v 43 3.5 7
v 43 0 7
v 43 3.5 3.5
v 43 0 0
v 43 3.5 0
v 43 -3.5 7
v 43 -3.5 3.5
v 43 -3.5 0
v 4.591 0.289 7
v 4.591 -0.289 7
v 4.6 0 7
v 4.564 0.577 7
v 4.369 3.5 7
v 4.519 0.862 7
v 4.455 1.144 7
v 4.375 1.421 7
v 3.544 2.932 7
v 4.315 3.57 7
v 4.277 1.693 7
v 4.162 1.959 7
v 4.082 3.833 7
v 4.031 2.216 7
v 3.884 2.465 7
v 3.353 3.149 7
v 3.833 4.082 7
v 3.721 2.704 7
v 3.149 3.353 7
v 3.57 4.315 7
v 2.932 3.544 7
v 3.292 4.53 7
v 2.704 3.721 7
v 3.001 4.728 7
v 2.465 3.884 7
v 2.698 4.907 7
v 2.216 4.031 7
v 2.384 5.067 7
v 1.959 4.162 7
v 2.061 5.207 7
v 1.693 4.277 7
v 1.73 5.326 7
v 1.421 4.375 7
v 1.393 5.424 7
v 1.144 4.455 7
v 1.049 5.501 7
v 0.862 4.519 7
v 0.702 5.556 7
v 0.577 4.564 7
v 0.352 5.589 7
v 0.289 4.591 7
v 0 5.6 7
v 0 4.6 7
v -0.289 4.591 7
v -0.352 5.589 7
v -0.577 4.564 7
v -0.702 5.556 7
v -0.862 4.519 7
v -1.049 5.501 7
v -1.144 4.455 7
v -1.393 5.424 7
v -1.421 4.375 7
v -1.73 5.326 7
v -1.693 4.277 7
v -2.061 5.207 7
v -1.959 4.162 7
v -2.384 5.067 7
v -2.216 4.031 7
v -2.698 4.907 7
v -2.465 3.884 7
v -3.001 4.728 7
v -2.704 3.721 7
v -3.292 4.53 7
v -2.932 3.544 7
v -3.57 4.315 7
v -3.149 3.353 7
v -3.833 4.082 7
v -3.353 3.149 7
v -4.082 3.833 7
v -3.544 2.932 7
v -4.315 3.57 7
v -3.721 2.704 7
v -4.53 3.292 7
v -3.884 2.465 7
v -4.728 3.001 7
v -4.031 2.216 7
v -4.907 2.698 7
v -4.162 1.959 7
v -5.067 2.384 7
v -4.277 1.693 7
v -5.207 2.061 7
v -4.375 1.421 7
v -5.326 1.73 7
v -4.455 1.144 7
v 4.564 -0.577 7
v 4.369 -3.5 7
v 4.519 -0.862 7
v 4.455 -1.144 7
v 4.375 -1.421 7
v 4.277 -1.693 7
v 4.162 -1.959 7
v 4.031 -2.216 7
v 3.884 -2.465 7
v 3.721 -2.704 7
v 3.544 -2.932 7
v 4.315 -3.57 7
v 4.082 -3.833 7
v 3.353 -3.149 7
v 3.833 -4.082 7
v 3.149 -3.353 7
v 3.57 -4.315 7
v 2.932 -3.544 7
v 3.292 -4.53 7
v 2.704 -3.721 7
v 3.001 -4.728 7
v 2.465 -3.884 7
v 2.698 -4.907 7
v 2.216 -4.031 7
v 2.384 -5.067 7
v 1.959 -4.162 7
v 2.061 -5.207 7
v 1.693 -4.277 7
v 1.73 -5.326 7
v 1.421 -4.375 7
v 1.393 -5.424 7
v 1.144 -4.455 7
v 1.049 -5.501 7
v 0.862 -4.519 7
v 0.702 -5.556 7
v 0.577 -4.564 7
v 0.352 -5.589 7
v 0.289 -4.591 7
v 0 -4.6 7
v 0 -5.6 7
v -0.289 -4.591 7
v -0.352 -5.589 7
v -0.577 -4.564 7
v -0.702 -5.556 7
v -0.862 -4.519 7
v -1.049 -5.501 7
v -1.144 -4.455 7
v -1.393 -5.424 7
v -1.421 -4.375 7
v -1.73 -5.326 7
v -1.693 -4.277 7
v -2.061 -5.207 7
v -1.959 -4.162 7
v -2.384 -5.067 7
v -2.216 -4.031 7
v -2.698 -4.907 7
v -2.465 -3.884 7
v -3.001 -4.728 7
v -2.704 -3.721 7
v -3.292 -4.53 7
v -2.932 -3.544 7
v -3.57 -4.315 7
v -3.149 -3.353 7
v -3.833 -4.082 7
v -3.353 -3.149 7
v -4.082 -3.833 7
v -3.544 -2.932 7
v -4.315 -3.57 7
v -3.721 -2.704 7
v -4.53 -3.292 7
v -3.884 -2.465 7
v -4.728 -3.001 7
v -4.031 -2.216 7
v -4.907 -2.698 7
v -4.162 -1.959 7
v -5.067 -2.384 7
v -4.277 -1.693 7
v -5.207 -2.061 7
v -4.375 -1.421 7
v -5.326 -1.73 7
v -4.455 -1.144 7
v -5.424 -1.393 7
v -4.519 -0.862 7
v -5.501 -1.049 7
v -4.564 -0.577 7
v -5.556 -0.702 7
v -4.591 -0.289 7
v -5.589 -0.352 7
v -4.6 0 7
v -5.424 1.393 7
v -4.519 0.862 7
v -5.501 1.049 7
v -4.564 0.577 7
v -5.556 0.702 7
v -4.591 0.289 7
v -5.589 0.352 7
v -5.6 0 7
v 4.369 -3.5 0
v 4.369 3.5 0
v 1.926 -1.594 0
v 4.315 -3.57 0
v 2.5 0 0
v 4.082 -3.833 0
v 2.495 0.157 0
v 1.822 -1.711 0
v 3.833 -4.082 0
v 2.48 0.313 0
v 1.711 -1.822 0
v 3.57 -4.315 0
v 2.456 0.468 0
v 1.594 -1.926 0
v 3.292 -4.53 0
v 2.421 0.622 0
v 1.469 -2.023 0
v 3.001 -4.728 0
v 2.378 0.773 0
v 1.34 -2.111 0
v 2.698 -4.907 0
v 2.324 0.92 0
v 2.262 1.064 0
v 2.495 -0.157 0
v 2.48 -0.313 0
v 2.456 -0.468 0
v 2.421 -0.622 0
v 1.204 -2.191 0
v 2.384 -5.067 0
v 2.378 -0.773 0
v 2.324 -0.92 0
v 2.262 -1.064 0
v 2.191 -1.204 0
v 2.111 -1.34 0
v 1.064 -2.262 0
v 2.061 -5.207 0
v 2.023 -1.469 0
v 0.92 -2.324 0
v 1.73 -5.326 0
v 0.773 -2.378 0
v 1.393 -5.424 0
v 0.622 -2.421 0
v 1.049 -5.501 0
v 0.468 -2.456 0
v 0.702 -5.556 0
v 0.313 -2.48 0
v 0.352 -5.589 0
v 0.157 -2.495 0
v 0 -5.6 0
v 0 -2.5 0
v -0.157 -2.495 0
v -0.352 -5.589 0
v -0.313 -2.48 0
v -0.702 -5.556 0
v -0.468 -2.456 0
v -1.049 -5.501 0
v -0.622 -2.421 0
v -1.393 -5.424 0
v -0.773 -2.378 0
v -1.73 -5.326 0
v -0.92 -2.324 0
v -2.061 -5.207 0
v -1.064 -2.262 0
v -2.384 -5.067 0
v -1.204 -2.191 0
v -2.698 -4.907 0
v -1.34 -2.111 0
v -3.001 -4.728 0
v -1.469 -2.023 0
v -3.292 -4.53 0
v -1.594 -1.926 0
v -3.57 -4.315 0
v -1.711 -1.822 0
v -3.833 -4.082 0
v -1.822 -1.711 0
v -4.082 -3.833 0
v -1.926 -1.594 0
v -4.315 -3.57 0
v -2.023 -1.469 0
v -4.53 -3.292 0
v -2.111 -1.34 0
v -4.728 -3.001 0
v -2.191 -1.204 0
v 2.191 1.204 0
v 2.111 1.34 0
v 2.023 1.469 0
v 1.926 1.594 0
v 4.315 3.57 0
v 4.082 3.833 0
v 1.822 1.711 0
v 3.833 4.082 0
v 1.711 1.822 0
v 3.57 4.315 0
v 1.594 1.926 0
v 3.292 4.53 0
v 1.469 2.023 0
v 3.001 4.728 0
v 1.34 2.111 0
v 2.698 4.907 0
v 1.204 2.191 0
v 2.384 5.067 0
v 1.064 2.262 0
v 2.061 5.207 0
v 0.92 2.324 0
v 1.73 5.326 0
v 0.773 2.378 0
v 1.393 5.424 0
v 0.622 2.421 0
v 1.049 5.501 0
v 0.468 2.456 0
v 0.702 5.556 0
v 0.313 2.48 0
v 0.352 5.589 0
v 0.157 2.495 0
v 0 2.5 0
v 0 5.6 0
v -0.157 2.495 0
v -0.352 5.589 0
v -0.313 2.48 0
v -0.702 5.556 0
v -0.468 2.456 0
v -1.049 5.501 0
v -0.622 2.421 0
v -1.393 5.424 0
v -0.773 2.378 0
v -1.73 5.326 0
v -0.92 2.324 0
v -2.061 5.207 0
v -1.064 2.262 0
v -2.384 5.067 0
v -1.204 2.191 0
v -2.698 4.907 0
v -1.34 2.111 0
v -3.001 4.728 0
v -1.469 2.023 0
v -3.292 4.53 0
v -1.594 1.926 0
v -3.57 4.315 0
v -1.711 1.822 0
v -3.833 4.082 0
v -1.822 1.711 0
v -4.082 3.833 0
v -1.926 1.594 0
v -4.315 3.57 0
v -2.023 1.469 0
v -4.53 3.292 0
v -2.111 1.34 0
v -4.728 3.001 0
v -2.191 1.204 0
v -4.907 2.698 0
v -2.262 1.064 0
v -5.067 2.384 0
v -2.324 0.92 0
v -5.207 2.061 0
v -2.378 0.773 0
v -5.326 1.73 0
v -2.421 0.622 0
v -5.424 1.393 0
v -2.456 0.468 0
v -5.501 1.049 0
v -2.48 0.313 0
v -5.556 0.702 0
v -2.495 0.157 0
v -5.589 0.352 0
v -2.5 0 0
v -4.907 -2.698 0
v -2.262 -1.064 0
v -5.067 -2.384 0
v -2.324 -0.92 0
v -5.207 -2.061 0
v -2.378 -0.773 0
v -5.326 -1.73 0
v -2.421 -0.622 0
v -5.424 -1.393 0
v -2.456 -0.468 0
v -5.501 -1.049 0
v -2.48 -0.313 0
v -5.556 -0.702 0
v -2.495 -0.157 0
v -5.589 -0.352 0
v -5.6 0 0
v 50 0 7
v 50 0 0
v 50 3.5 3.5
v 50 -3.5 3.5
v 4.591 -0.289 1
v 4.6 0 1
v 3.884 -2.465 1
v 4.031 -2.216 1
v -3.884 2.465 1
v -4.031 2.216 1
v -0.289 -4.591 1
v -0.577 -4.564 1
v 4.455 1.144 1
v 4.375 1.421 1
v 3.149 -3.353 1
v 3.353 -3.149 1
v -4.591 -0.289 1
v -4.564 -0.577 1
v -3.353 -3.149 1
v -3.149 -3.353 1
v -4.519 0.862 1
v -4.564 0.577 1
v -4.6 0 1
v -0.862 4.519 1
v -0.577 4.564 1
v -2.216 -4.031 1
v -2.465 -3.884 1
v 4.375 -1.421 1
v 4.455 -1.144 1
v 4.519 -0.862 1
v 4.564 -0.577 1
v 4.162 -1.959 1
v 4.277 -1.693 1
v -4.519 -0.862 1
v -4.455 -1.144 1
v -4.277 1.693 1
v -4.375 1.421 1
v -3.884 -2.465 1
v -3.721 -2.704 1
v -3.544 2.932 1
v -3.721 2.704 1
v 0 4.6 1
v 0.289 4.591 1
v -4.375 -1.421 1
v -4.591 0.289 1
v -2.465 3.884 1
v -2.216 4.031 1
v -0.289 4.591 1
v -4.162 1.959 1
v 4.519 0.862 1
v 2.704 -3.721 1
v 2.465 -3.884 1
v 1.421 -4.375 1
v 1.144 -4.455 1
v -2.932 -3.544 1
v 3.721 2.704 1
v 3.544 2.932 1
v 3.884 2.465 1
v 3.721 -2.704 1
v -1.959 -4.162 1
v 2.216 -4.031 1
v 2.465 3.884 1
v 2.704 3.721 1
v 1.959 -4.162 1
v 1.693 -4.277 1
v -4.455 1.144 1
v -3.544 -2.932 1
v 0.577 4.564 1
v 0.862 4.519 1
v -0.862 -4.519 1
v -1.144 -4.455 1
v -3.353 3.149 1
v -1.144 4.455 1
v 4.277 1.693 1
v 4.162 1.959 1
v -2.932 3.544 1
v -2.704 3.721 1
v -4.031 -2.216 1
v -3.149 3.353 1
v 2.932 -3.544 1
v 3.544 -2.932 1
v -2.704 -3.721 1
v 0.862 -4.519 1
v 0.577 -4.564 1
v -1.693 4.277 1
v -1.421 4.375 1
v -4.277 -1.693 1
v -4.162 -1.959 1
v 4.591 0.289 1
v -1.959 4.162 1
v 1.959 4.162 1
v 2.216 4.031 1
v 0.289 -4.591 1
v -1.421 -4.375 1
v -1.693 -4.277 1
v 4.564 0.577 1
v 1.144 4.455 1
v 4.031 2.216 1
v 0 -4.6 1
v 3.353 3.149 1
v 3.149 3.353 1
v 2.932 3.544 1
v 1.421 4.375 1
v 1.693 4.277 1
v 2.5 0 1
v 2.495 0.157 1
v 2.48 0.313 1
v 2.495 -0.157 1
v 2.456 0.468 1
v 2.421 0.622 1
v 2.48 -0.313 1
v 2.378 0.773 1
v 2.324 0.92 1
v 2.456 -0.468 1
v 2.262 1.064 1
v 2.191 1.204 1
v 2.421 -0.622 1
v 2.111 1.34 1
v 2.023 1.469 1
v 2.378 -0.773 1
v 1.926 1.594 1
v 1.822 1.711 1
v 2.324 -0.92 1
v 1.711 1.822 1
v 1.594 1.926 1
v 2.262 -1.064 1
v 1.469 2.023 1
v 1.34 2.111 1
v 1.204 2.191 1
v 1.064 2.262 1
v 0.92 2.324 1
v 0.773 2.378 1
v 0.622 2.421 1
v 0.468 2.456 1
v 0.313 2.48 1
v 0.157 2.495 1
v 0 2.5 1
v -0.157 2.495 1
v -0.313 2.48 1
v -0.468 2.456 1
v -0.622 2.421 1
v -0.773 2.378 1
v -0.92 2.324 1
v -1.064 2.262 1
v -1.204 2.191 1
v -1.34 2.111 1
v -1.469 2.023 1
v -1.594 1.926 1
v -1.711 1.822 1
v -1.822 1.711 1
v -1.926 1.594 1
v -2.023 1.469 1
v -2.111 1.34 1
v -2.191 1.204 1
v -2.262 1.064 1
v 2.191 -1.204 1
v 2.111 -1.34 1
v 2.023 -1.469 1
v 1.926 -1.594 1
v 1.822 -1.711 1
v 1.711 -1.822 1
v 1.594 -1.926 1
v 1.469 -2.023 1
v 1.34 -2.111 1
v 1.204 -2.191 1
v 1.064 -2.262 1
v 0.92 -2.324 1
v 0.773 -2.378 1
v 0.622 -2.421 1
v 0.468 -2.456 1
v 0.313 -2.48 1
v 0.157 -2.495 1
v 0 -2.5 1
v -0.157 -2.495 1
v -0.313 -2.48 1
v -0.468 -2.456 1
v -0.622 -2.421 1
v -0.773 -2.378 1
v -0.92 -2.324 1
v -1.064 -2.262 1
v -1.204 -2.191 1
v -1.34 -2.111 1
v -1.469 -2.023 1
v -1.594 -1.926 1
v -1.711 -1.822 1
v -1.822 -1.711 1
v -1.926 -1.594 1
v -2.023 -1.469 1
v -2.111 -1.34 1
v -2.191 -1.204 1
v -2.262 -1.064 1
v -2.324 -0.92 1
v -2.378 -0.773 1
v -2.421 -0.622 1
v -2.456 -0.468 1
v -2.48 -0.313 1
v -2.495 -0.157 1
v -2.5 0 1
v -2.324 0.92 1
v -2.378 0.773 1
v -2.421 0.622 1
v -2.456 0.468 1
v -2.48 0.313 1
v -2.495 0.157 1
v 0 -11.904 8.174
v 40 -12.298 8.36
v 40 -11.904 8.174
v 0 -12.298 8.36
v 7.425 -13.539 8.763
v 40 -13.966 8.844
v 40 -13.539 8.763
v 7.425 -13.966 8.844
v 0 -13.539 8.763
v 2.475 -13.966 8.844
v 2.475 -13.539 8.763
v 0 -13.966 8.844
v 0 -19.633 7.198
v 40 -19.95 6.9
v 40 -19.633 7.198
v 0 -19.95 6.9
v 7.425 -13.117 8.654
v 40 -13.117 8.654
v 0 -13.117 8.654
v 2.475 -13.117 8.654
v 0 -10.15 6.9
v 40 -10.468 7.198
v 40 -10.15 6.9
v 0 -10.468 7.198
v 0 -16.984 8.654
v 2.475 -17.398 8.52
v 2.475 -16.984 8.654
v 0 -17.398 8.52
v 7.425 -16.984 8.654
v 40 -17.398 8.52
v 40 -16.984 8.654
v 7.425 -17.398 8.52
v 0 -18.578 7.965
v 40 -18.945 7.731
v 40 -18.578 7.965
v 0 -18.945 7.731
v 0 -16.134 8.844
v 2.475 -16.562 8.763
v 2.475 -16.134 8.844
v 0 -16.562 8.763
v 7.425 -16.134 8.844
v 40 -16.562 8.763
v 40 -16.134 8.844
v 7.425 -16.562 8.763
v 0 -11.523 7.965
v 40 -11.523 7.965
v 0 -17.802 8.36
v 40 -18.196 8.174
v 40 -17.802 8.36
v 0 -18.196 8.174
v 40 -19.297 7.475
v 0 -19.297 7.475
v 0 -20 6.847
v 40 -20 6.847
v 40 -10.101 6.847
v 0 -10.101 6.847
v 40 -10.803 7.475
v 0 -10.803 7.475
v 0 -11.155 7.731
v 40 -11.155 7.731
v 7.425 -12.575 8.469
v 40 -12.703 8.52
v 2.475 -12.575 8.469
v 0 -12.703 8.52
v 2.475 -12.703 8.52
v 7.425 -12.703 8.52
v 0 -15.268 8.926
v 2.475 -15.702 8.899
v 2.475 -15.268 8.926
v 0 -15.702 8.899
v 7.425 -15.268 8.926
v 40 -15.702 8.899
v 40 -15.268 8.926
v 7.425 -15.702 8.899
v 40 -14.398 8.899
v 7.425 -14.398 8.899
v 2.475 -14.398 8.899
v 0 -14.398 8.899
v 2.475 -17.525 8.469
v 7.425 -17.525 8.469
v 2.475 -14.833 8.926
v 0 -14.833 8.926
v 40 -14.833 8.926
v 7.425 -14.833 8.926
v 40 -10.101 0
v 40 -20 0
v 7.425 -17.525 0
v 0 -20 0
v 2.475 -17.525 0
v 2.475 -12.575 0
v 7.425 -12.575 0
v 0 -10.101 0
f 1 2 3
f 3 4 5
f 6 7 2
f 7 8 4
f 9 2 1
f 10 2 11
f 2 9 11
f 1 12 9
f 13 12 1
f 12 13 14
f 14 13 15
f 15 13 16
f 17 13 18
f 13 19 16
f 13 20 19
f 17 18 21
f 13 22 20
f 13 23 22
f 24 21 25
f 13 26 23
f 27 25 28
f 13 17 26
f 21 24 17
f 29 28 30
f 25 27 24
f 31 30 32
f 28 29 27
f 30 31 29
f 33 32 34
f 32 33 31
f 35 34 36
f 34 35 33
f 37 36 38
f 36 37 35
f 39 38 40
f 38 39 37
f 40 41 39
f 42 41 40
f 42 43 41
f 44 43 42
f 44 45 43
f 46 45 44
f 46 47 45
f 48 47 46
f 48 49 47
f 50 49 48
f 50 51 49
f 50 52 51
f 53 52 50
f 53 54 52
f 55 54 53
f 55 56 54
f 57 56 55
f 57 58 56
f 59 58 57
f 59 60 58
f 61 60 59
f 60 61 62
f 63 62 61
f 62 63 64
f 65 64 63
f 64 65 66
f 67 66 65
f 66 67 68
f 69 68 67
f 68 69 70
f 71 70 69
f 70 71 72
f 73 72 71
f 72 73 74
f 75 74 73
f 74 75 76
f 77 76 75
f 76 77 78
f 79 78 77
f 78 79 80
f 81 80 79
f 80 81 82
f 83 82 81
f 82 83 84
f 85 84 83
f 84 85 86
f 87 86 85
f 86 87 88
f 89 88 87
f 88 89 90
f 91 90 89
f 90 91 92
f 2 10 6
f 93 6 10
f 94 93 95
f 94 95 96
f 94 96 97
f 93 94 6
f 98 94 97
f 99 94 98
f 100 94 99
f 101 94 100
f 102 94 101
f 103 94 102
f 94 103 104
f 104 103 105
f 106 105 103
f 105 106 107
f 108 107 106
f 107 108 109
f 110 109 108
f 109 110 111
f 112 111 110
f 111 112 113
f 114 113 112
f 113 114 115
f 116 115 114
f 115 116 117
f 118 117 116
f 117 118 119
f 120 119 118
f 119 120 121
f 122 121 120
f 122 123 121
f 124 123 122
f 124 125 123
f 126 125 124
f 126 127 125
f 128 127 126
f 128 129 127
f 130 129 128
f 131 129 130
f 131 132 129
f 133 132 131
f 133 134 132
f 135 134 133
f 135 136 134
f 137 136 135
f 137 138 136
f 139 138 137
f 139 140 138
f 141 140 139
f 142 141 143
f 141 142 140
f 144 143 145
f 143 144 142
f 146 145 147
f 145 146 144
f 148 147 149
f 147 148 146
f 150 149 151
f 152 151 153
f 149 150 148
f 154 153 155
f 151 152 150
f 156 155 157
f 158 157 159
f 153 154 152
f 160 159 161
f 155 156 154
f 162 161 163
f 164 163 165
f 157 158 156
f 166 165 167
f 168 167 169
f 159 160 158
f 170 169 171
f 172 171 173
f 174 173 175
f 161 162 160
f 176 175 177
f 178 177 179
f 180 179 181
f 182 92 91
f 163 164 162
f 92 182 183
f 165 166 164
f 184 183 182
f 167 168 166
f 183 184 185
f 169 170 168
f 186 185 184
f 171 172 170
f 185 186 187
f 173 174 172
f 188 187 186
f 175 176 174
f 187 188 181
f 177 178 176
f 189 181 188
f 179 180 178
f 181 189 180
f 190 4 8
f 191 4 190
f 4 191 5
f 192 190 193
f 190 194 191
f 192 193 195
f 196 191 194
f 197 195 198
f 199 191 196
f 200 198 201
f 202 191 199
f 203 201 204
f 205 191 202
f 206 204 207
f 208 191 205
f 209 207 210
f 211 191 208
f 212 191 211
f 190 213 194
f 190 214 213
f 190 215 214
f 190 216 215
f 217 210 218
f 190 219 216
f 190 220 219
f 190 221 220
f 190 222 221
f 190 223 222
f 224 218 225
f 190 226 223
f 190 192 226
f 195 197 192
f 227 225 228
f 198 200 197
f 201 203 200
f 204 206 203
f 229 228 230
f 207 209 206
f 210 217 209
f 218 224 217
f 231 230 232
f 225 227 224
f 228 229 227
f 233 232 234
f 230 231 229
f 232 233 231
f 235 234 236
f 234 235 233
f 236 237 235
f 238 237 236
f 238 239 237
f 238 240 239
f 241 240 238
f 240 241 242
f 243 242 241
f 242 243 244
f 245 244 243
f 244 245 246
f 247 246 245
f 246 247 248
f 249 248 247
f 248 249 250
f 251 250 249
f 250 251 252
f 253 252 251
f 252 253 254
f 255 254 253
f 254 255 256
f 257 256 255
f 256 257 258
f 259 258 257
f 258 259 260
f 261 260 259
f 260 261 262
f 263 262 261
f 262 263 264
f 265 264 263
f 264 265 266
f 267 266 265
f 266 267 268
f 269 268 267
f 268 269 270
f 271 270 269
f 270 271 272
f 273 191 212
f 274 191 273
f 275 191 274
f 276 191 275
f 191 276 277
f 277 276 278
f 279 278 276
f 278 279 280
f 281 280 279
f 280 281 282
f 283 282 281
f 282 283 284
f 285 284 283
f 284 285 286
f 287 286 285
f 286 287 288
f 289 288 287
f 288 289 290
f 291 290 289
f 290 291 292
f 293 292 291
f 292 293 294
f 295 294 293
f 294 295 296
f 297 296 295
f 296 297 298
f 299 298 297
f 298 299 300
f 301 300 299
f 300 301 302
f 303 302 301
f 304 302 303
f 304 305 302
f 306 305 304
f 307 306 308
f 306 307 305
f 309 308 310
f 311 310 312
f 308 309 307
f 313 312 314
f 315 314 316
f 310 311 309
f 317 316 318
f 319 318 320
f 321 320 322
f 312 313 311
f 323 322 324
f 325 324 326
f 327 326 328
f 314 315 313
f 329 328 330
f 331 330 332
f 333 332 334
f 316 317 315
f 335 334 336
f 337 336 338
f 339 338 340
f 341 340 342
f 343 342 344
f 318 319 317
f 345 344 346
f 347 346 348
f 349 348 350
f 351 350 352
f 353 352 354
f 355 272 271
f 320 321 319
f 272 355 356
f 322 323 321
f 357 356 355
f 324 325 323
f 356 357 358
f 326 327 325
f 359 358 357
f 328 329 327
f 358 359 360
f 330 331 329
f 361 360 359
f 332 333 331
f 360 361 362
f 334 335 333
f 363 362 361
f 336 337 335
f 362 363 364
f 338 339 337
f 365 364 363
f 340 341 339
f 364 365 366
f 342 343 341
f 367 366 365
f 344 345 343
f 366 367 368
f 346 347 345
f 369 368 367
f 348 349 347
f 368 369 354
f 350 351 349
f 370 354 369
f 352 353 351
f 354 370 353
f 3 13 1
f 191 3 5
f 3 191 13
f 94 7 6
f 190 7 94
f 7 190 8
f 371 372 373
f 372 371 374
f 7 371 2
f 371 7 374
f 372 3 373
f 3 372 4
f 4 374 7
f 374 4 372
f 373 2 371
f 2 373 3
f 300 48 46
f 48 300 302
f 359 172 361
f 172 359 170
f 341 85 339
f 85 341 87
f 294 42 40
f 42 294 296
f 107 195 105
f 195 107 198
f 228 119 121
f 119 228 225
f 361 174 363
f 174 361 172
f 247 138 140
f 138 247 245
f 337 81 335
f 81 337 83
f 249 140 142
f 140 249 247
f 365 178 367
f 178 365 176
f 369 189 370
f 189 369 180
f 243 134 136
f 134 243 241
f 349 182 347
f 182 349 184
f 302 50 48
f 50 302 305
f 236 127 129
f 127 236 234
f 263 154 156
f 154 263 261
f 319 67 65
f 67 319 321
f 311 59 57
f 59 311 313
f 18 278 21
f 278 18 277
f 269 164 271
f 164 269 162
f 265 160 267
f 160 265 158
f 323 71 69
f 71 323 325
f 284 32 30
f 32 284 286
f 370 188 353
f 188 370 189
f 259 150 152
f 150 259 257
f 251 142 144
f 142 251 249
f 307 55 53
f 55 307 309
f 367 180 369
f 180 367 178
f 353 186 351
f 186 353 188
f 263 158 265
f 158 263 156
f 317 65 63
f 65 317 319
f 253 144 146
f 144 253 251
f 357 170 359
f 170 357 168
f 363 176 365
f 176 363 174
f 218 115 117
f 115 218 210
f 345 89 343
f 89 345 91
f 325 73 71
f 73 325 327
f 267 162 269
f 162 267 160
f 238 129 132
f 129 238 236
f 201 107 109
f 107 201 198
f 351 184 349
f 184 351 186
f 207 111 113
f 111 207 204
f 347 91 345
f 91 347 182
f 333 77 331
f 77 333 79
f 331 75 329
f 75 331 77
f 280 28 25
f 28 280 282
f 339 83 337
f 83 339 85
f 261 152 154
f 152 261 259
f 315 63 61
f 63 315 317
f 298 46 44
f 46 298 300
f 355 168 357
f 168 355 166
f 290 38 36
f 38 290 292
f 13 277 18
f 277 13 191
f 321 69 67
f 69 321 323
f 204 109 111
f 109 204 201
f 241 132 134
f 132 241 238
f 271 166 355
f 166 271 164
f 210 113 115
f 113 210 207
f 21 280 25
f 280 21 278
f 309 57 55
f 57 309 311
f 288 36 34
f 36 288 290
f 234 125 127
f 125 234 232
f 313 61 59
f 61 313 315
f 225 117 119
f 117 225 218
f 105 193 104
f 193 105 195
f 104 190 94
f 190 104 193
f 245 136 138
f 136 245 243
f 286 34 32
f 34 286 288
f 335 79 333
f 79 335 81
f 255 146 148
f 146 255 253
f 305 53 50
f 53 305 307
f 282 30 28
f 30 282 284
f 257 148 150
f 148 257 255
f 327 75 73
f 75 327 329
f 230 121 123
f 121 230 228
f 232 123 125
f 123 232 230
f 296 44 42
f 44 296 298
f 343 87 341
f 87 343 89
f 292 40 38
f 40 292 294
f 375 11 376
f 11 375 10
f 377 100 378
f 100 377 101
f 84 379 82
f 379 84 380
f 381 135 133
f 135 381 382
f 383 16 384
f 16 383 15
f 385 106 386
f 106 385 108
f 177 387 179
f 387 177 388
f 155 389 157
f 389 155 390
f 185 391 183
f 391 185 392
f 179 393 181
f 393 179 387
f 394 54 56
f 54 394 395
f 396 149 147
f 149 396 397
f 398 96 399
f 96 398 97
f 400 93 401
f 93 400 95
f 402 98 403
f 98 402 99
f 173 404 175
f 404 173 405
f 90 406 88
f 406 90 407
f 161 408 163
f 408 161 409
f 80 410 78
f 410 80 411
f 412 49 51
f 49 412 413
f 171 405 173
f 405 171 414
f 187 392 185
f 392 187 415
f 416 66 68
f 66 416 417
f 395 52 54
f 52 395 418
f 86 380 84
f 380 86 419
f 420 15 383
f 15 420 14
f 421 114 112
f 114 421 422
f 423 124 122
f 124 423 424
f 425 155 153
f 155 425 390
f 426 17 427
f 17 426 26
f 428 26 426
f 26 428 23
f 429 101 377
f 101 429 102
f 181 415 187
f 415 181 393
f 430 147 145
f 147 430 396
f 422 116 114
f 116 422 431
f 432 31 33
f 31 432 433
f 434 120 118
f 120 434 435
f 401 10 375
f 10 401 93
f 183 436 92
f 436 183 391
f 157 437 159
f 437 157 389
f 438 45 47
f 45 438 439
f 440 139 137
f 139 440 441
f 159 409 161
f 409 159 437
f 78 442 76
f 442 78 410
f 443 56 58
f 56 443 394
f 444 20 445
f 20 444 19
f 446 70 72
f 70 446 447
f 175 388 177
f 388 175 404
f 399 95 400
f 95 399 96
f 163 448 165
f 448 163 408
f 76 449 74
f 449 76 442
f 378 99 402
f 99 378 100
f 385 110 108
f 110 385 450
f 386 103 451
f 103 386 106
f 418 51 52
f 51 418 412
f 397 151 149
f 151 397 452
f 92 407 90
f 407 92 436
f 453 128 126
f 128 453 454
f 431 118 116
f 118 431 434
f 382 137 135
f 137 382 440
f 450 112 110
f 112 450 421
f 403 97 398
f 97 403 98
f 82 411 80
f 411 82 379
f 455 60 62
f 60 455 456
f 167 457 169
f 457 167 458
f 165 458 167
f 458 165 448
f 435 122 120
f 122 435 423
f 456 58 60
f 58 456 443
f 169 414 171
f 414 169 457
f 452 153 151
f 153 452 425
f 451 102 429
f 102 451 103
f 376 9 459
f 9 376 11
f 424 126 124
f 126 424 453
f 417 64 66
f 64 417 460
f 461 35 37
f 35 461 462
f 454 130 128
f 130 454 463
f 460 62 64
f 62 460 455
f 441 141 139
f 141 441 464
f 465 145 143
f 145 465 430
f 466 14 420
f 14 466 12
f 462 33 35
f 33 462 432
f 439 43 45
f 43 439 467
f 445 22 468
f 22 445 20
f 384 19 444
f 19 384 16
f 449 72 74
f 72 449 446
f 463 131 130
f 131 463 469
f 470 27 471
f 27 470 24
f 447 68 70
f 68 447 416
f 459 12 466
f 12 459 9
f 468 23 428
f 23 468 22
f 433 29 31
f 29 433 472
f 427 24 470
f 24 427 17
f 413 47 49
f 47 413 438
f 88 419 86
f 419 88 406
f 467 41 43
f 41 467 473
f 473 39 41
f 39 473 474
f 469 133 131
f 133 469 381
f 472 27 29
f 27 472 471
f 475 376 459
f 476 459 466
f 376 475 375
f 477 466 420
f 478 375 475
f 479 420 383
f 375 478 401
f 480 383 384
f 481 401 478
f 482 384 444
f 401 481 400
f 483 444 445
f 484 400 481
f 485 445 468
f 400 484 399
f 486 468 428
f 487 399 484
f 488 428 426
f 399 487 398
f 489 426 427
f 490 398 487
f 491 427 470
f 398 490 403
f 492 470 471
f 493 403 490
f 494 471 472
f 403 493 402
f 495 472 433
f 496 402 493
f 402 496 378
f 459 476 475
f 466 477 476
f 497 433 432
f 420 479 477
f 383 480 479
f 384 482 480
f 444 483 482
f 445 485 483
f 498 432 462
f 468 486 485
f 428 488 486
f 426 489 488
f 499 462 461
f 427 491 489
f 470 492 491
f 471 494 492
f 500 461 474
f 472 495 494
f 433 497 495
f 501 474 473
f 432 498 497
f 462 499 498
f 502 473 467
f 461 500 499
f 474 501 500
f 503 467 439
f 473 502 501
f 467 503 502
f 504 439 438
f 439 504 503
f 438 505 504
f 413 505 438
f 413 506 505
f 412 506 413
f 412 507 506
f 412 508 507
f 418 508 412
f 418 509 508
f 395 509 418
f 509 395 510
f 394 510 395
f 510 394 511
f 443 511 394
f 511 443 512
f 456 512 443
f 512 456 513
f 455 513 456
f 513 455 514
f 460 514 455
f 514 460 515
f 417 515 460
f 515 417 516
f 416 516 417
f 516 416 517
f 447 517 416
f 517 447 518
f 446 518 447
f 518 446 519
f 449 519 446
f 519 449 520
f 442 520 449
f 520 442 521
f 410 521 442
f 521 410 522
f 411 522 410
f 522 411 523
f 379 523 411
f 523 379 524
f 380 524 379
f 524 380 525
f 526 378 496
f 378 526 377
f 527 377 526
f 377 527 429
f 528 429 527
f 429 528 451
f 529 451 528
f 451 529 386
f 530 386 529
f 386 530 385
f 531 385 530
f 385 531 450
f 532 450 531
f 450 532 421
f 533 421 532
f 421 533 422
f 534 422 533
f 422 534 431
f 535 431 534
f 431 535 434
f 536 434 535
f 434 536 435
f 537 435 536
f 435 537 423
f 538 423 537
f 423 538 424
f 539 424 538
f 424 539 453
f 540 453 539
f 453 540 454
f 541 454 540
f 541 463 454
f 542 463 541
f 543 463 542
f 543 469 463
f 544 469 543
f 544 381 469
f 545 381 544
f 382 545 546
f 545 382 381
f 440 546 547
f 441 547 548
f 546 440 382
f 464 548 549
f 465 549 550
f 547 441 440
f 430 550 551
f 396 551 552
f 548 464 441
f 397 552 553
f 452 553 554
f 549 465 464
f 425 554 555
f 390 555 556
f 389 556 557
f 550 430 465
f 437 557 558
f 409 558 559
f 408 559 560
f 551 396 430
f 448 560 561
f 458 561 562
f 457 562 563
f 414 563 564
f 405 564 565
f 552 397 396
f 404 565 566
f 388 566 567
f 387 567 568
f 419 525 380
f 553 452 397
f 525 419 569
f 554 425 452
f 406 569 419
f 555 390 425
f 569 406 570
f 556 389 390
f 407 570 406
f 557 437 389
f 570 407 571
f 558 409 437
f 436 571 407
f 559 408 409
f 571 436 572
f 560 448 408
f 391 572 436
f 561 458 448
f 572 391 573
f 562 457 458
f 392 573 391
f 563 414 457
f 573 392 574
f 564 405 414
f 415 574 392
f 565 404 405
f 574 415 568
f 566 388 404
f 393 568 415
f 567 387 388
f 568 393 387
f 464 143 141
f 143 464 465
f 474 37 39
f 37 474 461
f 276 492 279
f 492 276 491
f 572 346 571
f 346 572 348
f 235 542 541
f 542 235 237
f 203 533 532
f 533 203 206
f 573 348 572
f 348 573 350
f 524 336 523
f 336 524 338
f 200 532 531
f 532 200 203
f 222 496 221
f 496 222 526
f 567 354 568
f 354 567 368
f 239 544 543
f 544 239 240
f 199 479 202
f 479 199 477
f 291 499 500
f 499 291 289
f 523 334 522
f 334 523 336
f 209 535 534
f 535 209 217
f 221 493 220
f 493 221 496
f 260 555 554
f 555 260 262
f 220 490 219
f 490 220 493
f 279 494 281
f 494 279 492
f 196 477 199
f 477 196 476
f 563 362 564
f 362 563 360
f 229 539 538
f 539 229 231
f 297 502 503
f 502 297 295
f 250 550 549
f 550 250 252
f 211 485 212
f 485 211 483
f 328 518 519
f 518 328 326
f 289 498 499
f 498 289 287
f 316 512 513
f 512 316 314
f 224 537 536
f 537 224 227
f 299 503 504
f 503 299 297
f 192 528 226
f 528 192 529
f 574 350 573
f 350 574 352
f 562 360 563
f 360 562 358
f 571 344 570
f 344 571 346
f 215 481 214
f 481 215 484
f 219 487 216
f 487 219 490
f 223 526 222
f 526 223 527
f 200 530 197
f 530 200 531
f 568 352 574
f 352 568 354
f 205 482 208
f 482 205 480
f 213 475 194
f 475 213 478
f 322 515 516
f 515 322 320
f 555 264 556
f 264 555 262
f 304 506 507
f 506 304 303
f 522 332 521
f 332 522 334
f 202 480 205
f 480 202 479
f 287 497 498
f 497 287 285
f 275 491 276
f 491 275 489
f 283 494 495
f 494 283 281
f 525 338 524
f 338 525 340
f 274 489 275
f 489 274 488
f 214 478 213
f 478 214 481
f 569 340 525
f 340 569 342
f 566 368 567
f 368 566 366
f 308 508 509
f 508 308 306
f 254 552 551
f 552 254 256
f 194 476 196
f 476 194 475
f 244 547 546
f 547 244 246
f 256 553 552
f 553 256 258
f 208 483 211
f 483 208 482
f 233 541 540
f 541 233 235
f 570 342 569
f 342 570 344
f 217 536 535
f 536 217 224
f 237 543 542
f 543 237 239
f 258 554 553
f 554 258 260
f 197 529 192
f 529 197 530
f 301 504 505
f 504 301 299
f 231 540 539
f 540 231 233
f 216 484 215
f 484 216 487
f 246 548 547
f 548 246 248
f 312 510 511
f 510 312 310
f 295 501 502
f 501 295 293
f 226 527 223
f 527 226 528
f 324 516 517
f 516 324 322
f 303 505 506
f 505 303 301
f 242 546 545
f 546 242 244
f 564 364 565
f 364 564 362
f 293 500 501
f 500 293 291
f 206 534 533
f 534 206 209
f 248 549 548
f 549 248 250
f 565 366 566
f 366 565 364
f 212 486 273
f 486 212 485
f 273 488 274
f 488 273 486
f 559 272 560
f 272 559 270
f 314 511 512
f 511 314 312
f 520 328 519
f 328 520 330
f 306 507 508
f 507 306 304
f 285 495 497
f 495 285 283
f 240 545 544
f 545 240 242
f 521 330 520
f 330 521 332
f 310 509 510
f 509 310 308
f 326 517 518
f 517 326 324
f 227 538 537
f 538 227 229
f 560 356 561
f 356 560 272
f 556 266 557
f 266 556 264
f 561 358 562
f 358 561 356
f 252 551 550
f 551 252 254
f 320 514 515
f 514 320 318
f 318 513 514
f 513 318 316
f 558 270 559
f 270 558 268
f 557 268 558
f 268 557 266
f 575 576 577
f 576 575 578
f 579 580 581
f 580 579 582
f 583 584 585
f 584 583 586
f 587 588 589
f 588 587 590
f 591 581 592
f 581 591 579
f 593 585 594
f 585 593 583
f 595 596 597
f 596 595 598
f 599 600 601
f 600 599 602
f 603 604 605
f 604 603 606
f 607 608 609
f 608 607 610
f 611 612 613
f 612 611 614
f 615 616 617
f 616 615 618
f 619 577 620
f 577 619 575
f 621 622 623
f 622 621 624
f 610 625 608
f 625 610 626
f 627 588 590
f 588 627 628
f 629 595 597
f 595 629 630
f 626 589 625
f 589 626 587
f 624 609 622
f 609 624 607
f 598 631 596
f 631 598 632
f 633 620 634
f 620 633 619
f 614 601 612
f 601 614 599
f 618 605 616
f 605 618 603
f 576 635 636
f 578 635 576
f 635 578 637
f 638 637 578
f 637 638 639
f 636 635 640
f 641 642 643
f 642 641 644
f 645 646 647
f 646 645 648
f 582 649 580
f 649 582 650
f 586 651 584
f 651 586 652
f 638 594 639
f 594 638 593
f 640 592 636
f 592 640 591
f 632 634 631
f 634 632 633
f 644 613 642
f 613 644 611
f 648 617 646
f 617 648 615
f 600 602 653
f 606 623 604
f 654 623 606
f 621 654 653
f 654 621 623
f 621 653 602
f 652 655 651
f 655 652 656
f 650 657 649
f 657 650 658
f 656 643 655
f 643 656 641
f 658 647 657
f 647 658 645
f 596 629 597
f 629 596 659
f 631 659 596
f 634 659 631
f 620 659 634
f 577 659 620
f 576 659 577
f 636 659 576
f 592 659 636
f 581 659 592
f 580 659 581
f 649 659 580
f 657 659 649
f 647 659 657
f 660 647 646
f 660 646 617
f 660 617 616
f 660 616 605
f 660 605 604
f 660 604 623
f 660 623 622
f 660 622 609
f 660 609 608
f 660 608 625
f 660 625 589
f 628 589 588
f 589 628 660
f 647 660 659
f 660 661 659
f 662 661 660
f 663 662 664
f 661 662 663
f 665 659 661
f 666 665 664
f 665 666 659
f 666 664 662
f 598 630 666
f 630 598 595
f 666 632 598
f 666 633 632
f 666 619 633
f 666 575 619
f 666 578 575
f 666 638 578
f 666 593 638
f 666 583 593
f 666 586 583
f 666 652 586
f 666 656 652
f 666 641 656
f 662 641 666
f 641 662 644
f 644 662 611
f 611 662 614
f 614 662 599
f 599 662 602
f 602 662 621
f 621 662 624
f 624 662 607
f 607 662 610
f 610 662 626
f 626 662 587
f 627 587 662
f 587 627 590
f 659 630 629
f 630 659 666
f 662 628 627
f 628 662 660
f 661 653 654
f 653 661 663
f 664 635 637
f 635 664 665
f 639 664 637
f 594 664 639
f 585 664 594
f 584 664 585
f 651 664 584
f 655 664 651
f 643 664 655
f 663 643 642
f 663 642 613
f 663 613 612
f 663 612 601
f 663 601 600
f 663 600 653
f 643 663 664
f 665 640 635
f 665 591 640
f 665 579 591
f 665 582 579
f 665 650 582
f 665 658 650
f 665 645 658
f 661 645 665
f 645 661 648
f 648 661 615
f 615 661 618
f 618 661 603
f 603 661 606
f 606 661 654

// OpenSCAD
$fn = 100;

screw_radius = 4.6;
leglen = 50;
legthick = 7;

insert_thick = sqrt((legthick / 2) * (legthick / 2) * 2);
insert_len = legthick;

module screw_hole() {
  translate([0, 0, 1]) linear_extrude(height=legthick) circle(r=screw_radius);
  translate([0, 0, -1]) linear_extrude(height=legthick) circle(r=2.5);
}

module insert() {
  // intersection() {
  rotate([45, 0, 0]) cube([insert_len * 2, insert_thick, insert_thick], center=true);
  //   cube([insert_len * 3, legthick, legthick], center=true);
  // }
}

module leg() {
  difference() {
    union() {
      linear_extrude(height=legthick) circle(r=screw_radius + 1);
      union() {
        translate([0, -legthick / 2, 0]) cube([leglen - insert_len, legthick, legthick]);
        translate([leglen - insert_len, 0, legthick / 2]) insert();
      }
    }
    screw_hole();
  }
}

footthick = sqrt(legthick * legthick * 2);

module foot_sphere() {
  sphere(r=footthick * 0.7);
}

module foot() {
  footlen = 40;
  difference() {
    intersection() {
      //                   This number is eyeballed.
      //                           v
      translate([0, footthick / 2, 2]) hull() {
          translate([0, 0, 0]) foot_sphere();
          translate([footlen, 0, 0]) foot_sphere();
        }
      cube([footlen, footthick, footthick * 2]);
    }
    translate([footthick / 2, footthick / 2, insert_len - 1]) rotate([45, 90, 0]) insert();
  }
}

leg();
translate([0, -20, 0]) foot();
